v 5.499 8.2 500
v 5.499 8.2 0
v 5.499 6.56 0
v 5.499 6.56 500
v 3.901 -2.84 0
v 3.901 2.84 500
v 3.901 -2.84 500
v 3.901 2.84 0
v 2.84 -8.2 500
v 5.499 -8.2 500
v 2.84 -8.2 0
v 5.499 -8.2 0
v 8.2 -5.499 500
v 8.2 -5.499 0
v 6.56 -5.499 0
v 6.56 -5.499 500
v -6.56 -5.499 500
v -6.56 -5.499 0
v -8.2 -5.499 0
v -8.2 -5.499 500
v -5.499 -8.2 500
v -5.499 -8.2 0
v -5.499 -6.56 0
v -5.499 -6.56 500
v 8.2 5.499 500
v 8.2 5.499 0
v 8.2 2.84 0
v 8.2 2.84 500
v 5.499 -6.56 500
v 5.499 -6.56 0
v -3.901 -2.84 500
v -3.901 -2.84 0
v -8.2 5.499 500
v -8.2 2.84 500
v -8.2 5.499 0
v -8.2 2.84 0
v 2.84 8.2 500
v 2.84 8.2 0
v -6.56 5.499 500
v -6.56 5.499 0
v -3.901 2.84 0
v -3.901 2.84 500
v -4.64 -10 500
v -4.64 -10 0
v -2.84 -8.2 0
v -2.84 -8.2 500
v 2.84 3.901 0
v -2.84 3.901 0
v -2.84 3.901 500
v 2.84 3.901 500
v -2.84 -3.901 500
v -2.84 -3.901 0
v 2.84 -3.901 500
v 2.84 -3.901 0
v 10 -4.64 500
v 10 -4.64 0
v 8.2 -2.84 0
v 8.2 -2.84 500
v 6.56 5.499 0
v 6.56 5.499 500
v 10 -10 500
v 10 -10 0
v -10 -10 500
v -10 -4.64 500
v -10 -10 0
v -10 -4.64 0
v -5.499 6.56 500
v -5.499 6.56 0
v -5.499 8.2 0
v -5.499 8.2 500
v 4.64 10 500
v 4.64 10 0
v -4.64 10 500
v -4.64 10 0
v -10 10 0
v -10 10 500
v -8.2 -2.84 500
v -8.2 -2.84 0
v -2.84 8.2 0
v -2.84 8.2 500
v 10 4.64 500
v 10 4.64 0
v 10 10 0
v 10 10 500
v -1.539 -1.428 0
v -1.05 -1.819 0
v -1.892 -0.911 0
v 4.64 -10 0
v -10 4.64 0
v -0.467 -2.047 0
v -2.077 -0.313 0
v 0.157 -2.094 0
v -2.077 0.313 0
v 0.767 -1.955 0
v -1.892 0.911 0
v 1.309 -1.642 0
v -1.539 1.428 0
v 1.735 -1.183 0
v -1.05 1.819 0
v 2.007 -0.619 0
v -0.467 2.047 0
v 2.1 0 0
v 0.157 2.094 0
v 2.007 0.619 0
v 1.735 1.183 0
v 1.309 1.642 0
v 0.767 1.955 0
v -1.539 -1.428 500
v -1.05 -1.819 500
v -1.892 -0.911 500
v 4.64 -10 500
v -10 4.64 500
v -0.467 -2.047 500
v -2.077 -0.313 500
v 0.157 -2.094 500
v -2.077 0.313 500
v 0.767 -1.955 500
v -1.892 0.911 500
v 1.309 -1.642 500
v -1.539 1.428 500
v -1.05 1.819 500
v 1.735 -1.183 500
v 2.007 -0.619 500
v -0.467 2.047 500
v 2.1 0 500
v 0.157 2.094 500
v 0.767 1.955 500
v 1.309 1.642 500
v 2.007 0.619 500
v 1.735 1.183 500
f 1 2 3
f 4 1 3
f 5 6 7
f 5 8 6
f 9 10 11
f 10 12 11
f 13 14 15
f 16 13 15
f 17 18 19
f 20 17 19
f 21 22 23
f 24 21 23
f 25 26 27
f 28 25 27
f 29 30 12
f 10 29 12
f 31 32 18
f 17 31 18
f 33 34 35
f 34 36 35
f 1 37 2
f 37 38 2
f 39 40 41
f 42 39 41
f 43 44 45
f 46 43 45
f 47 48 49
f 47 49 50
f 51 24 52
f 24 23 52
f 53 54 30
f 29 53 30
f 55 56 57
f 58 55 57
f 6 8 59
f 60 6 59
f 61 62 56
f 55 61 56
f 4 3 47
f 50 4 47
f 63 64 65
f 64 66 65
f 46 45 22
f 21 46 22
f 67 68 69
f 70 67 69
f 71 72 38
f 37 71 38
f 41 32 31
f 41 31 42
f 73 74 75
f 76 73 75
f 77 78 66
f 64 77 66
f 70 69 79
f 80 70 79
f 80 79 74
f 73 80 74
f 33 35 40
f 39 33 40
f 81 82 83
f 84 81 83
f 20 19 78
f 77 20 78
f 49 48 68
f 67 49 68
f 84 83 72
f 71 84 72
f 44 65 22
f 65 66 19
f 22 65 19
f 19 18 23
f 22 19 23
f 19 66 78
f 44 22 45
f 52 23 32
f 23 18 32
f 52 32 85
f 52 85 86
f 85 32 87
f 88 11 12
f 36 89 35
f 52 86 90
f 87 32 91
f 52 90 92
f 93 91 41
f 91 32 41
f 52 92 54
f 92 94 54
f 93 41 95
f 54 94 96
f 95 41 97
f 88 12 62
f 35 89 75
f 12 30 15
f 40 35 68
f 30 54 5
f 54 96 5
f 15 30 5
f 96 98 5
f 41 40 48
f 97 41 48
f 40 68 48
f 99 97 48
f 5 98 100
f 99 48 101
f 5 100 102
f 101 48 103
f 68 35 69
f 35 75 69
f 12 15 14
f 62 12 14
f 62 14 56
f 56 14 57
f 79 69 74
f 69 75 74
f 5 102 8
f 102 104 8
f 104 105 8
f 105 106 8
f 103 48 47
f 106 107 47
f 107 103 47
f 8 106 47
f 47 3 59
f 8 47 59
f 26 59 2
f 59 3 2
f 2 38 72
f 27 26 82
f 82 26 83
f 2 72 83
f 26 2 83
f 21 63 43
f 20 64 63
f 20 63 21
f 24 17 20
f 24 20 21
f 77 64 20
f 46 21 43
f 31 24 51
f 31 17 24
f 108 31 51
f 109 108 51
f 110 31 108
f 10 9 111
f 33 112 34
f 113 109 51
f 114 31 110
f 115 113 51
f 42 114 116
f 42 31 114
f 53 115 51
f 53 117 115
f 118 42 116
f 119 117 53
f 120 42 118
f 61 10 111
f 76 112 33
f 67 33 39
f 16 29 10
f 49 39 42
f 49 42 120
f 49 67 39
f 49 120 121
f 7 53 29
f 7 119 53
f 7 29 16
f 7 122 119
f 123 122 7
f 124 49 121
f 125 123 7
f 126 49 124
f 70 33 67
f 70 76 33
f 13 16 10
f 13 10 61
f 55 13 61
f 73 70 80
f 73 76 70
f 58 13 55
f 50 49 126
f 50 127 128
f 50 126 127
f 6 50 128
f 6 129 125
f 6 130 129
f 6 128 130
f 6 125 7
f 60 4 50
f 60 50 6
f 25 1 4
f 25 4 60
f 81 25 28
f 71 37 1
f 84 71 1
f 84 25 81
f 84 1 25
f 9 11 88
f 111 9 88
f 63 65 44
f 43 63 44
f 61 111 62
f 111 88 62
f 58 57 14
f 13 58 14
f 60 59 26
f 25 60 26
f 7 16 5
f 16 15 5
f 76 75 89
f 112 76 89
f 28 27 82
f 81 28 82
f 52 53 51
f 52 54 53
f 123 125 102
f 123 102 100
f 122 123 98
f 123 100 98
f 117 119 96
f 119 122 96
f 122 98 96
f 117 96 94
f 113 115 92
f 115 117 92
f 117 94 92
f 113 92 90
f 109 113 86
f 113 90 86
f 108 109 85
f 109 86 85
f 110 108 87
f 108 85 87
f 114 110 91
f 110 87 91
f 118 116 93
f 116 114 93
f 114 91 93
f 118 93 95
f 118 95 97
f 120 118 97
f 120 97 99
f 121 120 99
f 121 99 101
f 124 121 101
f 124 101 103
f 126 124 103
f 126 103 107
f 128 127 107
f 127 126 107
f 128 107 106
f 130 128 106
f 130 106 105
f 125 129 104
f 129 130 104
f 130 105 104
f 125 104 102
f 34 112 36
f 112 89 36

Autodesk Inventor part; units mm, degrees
ref_plane "YZ Plane" through (0, 0, 0) normal (1, 0, 0) x (0, 1, 0)
ref_plane "XZ Plane" through (0, 0, 0) normal (0, 1, 0) x (-1, 0, 0)
ref_plane "XY Plane" through (0, 0, 0) normal (0, 0, 1) x (1, 0, 0)
sketch "Sketch1" plane through (0, 0, 0) normal (0, 0, 1) x (1, 0, 0)
  line L0 (-3.9007, 3.9007) -> (3.9007, 3.9007)
  line L1 (3.9007, 3.9007) -> (3.9007, -3.9007)
  line L2 (3.9007, -3.9007) -> (-3.9007, -3.9007)
  line L3 (-3.9007, -3.9007) -> (-3.9007, 3.9007)
  line L4 (0, 3.9007) -> (0, -3.9007) construction
  line L5 (-3.9007, 0) -> (3.9007, 0) construction
  circle A0 centre (0, 0) radius 2.1
  line L6 (0, 0) -> (-16.1173, 16.1173) construction
  line L7 (0, 0) -> (22.7933, 0) construction
  line L8 (-2.84, 3.9007) -> (-5.4993, 6.56)
  line L9 (-5.4993, 6.56) -> (-5.4993, 8.2)
  line L10 (-5.4993, 8.2) -> (-2.84, 8.2)
  line L11 (-2.84, 8.2) -> (-4.64, 10)
  line L12 (-4.64, 10) -> (-10, 10)
  line L13 (-10, 10) -> (-10, 4.64)
  line L14 (-10, 4.64) -> (-8.2, 2.84)
  line L15 (-8.2, 2.84) -> (-8.2, 5.4993)
  line L16 (-8.2, 5.4993) -> (-6.56, 5.4993)
  line L17 (-6.56, 5.4993) -> (-3.9007, 2.84)
  line L18 (-3.9007, 2.84) -> (-11.3102, 2.84) construction
  line L19 (-2.84, 3.9007) -> (-3.9007, 3.9007)
  line L20 (-3.9007, 2.84) -> (-3.9007, 3.9007)
  line L21 (-3.9007, -2.84) -> (-6.56, -5.4993)
  line L22 (-6.56, -5.4993) -> (-8.2, -5.4993)
  line L23 (-8.2, -5.4993) -> (-8.2, -2.84)
  line L24 (-8.2, -2.84) -> (-10, -4.64)
  line L25 (-10, -4.64) -> (-10, -10)
  line L26 (-10, -10) -> (-4.64, -10)
  line L27 (-4.64, -10) -> (-2.84, -8.2)
  line L28 (-2.84, -8.2) -> (-5.4993, -8.2)
  line L29 (-5.4993, -8.2) -> (-5.4993, -6.56)
  line L30 (-5.4993, -6.56) -> (-2.84, -3.9007)
  line L31 (-3.9007, -2.84) -> (-3.9007, -3.9007)
  line L32 (-2.84, -3.9007) -> (-3.9007, -3.9007)
  line L33 (2.84, -3.9007) -> (5.4993, -6.56)
  line L34 (5.4993, -6.56) -> (5.4993, -8.2)
  line L35 (5.4993, -8.2) -> (2.84, -8.2)
  line L36 (2.84, -8.2) -> (4.64, -10)
  line L37 (4.64, -10) -> (10, -10)
  line L38 (10, -10) -> (10, -4.64)
  line L39 (10, -4.64) -> (8.2, -2.84)
  line L40 (8.2, -2.84) -> (8.2, -5.4993)
  line L41 (8.2, -5.4993) -> (6.56, -5.4993)
  line L42 (6.56, -5.4993) -> (3.9007, -2.84)
  line L43 (2.84, -3.9007) -> (3.9007, -3.9007)
  line L44 (3.9007, -2.84) -> (3.9007, -3.9007)
  line L45 (3.9007, 2.84) -> (6.56, 5.4993)
  line L46 (6.56, 5.4993) -> (8.2, 5.4993)
  line L47 (8.2, 5.4993) -> (8.2, 2.84)
  line L48 (8.2, 2.84) -> (10, 4.64)
  line L49 (10, 4.64) -> (10, 10)
  line L50 (10, 10) -> (4.64, 10)
  line L51 (4.64, 10) -> (2.84, 8.2)
  line L52 (2.84, 8.2) -> (5.4993, 8.2)
  line L53 (5.4993, 8.2) -> (5.4993, 6.56)
  line L54 (5.4993, 6.56) -> (2.84, 3.9007)
  line L55 (3.9007, 2.84) -> (3.9007, 3.9007)
  line L56 (2.84, 3.9007) -> (3.9007, 3.9007)
  dimension "d7" = 4.2
  dimension "d8" = 135
  dimension "d9" = 1.5
  dimension "d10" = 1.64
  dimension "d11" = 1.8
  dimension "d12" = 2.84
  dimension "d13" = 10
  dimension "d16" = 360
extrude "Extrusion1" add sketch "Sketch1" along normal blind 500
properties part number "20x20x500mm"
